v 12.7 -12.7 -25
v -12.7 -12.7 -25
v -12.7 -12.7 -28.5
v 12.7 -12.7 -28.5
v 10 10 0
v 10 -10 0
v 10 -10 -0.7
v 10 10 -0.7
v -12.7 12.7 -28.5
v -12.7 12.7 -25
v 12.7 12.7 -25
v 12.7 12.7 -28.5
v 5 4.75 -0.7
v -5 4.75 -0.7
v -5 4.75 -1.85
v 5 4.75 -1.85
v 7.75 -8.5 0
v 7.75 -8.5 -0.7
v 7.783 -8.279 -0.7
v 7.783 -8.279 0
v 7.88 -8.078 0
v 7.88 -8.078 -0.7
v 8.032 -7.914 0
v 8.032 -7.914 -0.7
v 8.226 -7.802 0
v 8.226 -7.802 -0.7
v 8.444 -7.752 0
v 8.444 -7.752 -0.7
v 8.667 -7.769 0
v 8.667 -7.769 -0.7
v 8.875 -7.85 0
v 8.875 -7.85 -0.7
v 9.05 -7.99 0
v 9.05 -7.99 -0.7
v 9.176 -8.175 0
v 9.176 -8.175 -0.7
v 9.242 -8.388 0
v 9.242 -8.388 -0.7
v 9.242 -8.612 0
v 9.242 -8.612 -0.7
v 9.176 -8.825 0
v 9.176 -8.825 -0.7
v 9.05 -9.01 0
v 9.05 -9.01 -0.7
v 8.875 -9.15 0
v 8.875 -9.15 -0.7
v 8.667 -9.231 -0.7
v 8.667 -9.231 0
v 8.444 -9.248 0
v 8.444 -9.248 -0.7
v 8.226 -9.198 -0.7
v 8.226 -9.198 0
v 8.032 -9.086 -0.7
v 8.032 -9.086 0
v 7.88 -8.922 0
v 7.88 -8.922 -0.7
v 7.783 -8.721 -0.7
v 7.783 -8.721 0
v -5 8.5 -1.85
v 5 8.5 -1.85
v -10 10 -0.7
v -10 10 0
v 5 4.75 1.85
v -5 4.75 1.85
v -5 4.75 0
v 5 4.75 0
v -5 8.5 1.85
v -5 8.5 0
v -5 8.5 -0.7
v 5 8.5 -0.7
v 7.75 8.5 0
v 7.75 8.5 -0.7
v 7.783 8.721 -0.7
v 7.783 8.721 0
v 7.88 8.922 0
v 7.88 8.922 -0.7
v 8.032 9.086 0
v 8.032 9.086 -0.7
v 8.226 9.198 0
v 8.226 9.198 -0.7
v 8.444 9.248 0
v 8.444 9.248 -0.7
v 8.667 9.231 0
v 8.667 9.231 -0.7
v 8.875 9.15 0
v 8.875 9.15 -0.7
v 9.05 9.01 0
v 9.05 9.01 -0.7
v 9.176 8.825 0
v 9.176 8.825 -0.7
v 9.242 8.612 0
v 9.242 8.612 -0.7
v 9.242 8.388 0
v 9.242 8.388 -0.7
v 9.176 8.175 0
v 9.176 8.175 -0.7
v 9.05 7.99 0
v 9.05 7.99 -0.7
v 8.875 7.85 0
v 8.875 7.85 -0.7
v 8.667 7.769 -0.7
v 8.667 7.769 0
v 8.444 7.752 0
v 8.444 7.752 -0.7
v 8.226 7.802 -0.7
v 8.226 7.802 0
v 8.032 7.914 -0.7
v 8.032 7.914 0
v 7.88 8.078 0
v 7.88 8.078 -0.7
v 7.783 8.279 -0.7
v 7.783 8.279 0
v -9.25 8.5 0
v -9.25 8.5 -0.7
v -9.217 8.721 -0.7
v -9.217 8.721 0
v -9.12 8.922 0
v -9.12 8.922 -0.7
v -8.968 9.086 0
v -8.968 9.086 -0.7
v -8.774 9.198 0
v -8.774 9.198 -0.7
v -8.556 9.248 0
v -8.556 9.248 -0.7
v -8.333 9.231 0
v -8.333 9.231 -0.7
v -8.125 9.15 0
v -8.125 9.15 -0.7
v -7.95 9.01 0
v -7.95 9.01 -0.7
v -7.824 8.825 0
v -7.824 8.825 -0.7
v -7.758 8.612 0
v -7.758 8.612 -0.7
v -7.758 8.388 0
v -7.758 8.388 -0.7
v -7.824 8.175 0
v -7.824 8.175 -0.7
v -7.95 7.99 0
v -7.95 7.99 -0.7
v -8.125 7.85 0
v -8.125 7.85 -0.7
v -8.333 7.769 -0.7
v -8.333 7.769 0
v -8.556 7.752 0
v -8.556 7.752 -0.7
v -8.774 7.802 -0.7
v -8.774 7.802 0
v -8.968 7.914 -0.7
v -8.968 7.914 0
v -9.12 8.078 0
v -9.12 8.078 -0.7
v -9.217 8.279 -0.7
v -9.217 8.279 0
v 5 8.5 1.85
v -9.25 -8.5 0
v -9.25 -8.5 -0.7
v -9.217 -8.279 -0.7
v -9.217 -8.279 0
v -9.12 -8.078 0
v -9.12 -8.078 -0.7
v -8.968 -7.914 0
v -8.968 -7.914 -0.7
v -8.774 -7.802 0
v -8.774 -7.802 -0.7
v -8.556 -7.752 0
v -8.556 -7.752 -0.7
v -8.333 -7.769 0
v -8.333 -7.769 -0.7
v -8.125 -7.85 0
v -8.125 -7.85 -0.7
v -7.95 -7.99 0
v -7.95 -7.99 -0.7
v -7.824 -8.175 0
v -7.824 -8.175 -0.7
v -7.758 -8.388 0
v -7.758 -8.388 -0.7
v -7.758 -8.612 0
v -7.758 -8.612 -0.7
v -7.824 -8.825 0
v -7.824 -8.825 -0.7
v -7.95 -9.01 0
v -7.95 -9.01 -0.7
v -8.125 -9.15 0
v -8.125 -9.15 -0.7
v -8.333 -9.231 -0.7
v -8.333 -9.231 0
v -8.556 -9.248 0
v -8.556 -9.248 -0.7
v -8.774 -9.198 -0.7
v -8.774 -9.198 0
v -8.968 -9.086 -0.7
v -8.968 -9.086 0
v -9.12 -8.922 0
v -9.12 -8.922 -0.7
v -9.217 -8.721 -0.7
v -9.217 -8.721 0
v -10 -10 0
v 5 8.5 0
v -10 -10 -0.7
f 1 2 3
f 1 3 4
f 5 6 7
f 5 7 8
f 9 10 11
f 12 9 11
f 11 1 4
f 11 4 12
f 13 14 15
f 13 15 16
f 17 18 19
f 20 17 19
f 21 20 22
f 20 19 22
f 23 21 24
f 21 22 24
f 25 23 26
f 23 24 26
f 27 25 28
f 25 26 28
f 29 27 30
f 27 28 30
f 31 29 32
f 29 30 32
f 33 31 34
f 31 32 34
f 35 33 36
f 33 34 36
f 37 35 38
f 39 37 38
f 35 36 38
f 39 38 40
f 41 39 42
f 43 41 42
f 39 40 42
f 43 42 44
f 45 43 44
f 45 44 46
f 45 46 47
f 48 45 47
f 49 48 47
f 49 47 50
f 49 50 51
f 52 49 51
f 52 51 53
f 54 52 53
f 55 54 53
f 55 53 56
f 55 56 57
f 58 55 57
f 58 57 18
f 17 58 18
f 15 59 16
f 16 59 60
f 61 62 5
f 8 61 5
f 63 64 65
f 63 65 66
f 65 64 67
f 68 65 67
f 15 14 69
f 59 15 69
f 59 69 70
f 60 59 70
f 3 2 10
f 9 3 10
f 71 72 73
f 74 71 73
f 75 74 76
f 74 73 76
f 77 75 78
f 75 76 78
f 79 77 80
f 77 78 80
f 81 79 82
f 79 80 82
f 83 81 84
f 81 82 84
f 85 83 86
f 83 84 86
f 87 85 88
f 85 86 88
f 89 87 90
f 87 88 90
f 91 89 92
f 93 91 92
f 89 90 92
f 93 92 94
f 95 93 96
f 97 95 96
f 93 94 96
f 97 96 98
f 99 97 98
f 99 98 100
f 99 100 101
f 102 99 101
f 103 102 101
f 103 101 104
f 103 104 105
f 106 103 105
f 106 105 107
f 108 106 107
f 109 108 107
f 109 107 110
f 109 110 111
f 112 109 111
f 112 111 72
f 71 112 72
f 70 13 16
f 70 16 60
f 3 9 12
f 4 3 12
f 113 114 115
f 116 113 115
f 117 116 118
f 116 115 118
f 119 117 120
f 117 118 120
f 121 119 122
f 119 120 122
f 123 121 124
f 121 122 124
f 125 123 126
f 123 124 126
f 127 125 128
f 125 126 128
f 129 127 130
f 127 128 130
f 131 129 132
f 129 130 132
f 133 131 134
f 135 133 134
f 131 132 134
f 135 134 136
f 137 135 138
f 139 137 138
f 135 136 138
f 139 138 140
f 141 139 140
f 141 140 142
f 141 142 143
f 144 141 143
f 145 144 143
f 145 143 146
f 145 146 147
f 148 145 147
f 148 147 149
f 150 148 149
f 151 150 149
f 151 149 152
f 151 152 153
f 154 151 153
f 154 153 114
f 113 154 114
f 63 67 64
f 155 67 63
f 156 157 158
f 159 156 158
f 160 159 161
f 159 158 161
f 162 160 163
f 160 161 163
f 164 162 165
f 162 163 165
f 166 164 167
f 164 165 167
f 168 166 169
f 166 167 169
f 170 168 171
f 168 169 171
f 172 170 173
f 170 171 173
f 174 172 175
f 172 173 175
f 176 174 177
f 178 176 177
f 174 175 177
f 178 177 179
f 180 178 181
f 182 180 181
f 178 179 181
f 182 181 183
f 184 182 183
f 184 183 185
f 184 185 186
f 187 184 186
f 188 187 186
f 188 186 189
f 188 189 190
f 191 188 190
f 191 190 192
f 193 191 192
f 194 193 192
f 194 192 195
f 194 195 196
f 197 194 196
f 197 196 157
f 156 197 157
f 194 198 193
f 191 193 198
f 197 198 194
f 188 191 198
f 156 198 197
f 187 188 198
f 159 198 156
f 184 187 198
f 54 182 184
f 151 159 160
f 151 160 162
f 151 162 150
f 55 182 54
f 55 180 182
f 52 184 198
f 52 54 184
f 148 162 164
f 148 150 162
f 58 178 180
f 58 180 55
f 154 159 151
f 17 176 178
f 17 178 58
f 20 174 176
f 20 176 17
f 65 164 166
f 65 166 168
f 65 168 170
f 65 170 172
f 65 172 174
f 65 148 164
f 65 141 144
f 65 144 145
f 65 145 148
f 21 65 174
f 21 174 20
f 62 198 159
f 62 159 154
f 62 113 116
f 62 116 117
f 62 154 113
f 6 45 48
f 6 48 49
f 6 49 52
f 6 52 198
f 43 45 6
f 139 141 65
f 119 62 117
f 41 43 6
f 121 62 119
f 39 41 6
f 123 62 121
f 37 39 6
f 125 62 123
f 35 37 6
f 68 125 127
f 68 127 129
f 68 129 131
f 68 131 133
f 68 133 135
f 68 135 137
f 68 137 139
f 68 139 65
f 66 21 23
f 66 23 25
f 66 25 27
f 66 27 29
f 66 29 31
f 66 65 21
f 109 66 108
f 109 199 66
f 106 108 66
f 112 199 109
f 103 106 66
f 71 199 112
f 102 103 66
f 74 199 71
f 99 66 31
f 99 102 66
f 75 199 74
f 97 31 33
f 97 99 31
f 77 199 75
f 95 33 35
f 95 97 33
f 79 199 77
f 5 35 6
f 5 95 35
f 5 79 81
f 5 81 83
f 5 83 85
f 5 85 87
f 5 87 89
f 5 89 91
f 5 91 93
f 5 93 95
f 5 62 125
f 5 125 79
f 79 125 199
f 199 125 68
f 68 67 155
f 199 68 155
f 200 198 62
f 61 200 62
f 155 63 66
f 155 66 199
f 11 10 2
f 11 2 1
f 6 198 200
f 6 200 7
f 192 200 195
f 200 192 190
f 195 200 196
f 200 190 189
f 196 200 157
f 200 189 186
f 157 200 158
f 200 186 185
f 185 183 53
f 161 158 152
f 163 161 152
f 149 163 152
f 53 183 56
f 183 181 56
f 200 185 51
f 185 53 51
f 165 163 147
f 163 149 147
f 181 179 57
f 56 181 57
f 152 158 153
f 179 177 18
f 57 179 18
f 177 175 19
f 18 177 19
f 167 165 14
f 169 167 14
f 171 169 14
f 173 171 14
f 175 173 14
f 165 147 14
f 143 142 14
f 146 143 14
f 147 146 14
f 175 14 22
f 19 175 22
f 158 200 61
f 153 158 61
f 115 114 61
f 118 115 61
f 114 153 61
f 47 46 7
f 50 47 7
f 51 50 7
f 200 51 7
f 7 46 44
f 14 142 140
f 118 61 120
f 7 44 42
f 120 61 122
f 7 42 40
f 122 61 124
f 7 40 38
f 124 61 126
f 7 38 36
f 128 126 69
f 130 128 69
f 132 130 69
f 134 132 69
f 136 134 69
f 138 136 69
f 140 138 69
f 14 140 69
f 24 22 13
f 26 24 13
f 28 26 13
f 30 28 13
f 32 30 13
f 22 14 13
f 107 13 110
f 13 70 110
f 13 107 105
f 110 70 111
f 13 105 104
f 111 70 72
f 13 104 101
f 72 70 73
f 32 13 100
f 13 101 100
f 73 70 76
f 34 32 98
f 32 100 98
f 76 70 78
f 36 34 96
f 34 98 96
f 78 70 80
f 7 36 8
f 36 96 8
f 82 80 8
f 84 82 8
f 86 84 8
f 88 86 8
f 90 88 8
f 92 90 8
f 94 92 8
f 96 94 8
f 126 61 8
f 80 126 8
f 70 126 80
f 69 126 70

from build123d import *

# Parameters (mm, degrees)
F0_W     = 20
F0_H     = 20
F0_W_2   = 10
F0_H_2   = 3.75
F1_DEPTH = 0.7
F2_D     = 1.5
F3_W     = 10
F3_H     = 3.75
F4_DEPTH = 1.85
F6_W     = 25.4
F6_H     = 25.4
F7_DEPTH = 3.5


with BuildPart() as f1:
    # F0 (on Top) → F1 (new body)
    with BuildSketch(Plane.XY):
        Rectangle(F0_W, F0_H)
        with Locations((0, 6.625)):
            Rectangle(F0_W_2, F0_H_2, mode=Mode.SUBTRACT)
        with Locations((0, 6.625)):
            Rectangle(F0_W_2, F0_H_2)
    extrude(amount=-F1_DEPTH)

    # F2 (through all)
    with Locations(Plane.XY):
        with Locations((-8.5, 8.5), (8.5, 8.5), (8.5, -8.5), (-8.5, -8.5)):
            Hole(F2_D / 2)

    # F3 (on Top) → F4 (join, symmetric)
    with BuildSketch(Plane.XY):
        with Locations((0, 6.625)):
            Rectangle(F3_W, F3_H)
    extrude(amount=F4_DEPTH, both=True)


with BuildPart() as f7:
    # F6 (on offset) → F7 (new body)
    with BuildSketch(Plane.XY.offset(-25)):
        Rectangle(F6_W, F6_H)
    extrude(amount=-F7_DEPTH)


solid = Compound([f1.part, f7.part])
